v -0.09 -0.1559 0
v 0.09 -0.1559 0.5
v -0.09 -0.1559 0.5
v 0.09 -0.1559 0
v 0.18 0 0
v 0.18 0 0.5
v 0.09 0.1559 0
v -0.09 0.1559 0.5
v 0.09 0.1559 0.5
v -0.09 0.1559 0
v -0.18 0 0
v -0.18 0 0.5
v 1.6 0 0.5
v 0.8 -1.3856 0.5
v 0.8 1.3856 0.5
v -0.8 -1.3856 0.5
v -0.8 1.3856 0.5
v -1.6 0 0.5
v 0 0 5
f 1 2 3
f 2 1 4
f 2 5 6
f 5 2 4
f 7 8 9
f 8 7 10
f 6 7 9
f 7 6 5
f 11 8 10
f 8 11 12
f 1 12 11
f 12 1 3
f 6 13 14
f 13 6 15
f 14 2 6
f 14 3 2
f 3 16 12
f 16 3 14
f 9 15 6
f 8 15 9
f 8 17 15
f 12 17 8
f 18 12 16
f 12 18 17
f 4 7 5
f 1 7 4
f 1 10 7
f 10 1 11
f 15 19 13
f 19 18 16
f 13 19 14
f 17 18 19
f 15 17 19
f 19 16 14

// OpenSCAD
// Conifer variant 0 — small bushy. Short trunk + a single fat hexagonal
// cone for the canopy. One of three conifer variants the auto-forest
// pulls from based on the per-cell hash; per-instance ColorTint supplies
// the foliage shade at draw time, so the white-texture path is fine.
// Conventions, units, and axis docs: see models-src/README.md.

$fn = 6;

trunk_r   = 0.18;
trunk_h   = 0.50;
canopy_r  = 1.60;
canopy_h  = 4.50;

module tree() {
    // Trunk — short stub; mostly hidden by the canopy at gameplay zoom.
    color("SaddleBrown")
        cylinder(h = trunk_h, r = trunk_r);
    // Canopy — single hex pyramid, base sat on the trunk top.
    color("DarkGreen")
        translate([0, 0, trunk_h])
            cylinder(h = canopy_h, r1 = canopy_r, r2 = 0);
}

tree();
